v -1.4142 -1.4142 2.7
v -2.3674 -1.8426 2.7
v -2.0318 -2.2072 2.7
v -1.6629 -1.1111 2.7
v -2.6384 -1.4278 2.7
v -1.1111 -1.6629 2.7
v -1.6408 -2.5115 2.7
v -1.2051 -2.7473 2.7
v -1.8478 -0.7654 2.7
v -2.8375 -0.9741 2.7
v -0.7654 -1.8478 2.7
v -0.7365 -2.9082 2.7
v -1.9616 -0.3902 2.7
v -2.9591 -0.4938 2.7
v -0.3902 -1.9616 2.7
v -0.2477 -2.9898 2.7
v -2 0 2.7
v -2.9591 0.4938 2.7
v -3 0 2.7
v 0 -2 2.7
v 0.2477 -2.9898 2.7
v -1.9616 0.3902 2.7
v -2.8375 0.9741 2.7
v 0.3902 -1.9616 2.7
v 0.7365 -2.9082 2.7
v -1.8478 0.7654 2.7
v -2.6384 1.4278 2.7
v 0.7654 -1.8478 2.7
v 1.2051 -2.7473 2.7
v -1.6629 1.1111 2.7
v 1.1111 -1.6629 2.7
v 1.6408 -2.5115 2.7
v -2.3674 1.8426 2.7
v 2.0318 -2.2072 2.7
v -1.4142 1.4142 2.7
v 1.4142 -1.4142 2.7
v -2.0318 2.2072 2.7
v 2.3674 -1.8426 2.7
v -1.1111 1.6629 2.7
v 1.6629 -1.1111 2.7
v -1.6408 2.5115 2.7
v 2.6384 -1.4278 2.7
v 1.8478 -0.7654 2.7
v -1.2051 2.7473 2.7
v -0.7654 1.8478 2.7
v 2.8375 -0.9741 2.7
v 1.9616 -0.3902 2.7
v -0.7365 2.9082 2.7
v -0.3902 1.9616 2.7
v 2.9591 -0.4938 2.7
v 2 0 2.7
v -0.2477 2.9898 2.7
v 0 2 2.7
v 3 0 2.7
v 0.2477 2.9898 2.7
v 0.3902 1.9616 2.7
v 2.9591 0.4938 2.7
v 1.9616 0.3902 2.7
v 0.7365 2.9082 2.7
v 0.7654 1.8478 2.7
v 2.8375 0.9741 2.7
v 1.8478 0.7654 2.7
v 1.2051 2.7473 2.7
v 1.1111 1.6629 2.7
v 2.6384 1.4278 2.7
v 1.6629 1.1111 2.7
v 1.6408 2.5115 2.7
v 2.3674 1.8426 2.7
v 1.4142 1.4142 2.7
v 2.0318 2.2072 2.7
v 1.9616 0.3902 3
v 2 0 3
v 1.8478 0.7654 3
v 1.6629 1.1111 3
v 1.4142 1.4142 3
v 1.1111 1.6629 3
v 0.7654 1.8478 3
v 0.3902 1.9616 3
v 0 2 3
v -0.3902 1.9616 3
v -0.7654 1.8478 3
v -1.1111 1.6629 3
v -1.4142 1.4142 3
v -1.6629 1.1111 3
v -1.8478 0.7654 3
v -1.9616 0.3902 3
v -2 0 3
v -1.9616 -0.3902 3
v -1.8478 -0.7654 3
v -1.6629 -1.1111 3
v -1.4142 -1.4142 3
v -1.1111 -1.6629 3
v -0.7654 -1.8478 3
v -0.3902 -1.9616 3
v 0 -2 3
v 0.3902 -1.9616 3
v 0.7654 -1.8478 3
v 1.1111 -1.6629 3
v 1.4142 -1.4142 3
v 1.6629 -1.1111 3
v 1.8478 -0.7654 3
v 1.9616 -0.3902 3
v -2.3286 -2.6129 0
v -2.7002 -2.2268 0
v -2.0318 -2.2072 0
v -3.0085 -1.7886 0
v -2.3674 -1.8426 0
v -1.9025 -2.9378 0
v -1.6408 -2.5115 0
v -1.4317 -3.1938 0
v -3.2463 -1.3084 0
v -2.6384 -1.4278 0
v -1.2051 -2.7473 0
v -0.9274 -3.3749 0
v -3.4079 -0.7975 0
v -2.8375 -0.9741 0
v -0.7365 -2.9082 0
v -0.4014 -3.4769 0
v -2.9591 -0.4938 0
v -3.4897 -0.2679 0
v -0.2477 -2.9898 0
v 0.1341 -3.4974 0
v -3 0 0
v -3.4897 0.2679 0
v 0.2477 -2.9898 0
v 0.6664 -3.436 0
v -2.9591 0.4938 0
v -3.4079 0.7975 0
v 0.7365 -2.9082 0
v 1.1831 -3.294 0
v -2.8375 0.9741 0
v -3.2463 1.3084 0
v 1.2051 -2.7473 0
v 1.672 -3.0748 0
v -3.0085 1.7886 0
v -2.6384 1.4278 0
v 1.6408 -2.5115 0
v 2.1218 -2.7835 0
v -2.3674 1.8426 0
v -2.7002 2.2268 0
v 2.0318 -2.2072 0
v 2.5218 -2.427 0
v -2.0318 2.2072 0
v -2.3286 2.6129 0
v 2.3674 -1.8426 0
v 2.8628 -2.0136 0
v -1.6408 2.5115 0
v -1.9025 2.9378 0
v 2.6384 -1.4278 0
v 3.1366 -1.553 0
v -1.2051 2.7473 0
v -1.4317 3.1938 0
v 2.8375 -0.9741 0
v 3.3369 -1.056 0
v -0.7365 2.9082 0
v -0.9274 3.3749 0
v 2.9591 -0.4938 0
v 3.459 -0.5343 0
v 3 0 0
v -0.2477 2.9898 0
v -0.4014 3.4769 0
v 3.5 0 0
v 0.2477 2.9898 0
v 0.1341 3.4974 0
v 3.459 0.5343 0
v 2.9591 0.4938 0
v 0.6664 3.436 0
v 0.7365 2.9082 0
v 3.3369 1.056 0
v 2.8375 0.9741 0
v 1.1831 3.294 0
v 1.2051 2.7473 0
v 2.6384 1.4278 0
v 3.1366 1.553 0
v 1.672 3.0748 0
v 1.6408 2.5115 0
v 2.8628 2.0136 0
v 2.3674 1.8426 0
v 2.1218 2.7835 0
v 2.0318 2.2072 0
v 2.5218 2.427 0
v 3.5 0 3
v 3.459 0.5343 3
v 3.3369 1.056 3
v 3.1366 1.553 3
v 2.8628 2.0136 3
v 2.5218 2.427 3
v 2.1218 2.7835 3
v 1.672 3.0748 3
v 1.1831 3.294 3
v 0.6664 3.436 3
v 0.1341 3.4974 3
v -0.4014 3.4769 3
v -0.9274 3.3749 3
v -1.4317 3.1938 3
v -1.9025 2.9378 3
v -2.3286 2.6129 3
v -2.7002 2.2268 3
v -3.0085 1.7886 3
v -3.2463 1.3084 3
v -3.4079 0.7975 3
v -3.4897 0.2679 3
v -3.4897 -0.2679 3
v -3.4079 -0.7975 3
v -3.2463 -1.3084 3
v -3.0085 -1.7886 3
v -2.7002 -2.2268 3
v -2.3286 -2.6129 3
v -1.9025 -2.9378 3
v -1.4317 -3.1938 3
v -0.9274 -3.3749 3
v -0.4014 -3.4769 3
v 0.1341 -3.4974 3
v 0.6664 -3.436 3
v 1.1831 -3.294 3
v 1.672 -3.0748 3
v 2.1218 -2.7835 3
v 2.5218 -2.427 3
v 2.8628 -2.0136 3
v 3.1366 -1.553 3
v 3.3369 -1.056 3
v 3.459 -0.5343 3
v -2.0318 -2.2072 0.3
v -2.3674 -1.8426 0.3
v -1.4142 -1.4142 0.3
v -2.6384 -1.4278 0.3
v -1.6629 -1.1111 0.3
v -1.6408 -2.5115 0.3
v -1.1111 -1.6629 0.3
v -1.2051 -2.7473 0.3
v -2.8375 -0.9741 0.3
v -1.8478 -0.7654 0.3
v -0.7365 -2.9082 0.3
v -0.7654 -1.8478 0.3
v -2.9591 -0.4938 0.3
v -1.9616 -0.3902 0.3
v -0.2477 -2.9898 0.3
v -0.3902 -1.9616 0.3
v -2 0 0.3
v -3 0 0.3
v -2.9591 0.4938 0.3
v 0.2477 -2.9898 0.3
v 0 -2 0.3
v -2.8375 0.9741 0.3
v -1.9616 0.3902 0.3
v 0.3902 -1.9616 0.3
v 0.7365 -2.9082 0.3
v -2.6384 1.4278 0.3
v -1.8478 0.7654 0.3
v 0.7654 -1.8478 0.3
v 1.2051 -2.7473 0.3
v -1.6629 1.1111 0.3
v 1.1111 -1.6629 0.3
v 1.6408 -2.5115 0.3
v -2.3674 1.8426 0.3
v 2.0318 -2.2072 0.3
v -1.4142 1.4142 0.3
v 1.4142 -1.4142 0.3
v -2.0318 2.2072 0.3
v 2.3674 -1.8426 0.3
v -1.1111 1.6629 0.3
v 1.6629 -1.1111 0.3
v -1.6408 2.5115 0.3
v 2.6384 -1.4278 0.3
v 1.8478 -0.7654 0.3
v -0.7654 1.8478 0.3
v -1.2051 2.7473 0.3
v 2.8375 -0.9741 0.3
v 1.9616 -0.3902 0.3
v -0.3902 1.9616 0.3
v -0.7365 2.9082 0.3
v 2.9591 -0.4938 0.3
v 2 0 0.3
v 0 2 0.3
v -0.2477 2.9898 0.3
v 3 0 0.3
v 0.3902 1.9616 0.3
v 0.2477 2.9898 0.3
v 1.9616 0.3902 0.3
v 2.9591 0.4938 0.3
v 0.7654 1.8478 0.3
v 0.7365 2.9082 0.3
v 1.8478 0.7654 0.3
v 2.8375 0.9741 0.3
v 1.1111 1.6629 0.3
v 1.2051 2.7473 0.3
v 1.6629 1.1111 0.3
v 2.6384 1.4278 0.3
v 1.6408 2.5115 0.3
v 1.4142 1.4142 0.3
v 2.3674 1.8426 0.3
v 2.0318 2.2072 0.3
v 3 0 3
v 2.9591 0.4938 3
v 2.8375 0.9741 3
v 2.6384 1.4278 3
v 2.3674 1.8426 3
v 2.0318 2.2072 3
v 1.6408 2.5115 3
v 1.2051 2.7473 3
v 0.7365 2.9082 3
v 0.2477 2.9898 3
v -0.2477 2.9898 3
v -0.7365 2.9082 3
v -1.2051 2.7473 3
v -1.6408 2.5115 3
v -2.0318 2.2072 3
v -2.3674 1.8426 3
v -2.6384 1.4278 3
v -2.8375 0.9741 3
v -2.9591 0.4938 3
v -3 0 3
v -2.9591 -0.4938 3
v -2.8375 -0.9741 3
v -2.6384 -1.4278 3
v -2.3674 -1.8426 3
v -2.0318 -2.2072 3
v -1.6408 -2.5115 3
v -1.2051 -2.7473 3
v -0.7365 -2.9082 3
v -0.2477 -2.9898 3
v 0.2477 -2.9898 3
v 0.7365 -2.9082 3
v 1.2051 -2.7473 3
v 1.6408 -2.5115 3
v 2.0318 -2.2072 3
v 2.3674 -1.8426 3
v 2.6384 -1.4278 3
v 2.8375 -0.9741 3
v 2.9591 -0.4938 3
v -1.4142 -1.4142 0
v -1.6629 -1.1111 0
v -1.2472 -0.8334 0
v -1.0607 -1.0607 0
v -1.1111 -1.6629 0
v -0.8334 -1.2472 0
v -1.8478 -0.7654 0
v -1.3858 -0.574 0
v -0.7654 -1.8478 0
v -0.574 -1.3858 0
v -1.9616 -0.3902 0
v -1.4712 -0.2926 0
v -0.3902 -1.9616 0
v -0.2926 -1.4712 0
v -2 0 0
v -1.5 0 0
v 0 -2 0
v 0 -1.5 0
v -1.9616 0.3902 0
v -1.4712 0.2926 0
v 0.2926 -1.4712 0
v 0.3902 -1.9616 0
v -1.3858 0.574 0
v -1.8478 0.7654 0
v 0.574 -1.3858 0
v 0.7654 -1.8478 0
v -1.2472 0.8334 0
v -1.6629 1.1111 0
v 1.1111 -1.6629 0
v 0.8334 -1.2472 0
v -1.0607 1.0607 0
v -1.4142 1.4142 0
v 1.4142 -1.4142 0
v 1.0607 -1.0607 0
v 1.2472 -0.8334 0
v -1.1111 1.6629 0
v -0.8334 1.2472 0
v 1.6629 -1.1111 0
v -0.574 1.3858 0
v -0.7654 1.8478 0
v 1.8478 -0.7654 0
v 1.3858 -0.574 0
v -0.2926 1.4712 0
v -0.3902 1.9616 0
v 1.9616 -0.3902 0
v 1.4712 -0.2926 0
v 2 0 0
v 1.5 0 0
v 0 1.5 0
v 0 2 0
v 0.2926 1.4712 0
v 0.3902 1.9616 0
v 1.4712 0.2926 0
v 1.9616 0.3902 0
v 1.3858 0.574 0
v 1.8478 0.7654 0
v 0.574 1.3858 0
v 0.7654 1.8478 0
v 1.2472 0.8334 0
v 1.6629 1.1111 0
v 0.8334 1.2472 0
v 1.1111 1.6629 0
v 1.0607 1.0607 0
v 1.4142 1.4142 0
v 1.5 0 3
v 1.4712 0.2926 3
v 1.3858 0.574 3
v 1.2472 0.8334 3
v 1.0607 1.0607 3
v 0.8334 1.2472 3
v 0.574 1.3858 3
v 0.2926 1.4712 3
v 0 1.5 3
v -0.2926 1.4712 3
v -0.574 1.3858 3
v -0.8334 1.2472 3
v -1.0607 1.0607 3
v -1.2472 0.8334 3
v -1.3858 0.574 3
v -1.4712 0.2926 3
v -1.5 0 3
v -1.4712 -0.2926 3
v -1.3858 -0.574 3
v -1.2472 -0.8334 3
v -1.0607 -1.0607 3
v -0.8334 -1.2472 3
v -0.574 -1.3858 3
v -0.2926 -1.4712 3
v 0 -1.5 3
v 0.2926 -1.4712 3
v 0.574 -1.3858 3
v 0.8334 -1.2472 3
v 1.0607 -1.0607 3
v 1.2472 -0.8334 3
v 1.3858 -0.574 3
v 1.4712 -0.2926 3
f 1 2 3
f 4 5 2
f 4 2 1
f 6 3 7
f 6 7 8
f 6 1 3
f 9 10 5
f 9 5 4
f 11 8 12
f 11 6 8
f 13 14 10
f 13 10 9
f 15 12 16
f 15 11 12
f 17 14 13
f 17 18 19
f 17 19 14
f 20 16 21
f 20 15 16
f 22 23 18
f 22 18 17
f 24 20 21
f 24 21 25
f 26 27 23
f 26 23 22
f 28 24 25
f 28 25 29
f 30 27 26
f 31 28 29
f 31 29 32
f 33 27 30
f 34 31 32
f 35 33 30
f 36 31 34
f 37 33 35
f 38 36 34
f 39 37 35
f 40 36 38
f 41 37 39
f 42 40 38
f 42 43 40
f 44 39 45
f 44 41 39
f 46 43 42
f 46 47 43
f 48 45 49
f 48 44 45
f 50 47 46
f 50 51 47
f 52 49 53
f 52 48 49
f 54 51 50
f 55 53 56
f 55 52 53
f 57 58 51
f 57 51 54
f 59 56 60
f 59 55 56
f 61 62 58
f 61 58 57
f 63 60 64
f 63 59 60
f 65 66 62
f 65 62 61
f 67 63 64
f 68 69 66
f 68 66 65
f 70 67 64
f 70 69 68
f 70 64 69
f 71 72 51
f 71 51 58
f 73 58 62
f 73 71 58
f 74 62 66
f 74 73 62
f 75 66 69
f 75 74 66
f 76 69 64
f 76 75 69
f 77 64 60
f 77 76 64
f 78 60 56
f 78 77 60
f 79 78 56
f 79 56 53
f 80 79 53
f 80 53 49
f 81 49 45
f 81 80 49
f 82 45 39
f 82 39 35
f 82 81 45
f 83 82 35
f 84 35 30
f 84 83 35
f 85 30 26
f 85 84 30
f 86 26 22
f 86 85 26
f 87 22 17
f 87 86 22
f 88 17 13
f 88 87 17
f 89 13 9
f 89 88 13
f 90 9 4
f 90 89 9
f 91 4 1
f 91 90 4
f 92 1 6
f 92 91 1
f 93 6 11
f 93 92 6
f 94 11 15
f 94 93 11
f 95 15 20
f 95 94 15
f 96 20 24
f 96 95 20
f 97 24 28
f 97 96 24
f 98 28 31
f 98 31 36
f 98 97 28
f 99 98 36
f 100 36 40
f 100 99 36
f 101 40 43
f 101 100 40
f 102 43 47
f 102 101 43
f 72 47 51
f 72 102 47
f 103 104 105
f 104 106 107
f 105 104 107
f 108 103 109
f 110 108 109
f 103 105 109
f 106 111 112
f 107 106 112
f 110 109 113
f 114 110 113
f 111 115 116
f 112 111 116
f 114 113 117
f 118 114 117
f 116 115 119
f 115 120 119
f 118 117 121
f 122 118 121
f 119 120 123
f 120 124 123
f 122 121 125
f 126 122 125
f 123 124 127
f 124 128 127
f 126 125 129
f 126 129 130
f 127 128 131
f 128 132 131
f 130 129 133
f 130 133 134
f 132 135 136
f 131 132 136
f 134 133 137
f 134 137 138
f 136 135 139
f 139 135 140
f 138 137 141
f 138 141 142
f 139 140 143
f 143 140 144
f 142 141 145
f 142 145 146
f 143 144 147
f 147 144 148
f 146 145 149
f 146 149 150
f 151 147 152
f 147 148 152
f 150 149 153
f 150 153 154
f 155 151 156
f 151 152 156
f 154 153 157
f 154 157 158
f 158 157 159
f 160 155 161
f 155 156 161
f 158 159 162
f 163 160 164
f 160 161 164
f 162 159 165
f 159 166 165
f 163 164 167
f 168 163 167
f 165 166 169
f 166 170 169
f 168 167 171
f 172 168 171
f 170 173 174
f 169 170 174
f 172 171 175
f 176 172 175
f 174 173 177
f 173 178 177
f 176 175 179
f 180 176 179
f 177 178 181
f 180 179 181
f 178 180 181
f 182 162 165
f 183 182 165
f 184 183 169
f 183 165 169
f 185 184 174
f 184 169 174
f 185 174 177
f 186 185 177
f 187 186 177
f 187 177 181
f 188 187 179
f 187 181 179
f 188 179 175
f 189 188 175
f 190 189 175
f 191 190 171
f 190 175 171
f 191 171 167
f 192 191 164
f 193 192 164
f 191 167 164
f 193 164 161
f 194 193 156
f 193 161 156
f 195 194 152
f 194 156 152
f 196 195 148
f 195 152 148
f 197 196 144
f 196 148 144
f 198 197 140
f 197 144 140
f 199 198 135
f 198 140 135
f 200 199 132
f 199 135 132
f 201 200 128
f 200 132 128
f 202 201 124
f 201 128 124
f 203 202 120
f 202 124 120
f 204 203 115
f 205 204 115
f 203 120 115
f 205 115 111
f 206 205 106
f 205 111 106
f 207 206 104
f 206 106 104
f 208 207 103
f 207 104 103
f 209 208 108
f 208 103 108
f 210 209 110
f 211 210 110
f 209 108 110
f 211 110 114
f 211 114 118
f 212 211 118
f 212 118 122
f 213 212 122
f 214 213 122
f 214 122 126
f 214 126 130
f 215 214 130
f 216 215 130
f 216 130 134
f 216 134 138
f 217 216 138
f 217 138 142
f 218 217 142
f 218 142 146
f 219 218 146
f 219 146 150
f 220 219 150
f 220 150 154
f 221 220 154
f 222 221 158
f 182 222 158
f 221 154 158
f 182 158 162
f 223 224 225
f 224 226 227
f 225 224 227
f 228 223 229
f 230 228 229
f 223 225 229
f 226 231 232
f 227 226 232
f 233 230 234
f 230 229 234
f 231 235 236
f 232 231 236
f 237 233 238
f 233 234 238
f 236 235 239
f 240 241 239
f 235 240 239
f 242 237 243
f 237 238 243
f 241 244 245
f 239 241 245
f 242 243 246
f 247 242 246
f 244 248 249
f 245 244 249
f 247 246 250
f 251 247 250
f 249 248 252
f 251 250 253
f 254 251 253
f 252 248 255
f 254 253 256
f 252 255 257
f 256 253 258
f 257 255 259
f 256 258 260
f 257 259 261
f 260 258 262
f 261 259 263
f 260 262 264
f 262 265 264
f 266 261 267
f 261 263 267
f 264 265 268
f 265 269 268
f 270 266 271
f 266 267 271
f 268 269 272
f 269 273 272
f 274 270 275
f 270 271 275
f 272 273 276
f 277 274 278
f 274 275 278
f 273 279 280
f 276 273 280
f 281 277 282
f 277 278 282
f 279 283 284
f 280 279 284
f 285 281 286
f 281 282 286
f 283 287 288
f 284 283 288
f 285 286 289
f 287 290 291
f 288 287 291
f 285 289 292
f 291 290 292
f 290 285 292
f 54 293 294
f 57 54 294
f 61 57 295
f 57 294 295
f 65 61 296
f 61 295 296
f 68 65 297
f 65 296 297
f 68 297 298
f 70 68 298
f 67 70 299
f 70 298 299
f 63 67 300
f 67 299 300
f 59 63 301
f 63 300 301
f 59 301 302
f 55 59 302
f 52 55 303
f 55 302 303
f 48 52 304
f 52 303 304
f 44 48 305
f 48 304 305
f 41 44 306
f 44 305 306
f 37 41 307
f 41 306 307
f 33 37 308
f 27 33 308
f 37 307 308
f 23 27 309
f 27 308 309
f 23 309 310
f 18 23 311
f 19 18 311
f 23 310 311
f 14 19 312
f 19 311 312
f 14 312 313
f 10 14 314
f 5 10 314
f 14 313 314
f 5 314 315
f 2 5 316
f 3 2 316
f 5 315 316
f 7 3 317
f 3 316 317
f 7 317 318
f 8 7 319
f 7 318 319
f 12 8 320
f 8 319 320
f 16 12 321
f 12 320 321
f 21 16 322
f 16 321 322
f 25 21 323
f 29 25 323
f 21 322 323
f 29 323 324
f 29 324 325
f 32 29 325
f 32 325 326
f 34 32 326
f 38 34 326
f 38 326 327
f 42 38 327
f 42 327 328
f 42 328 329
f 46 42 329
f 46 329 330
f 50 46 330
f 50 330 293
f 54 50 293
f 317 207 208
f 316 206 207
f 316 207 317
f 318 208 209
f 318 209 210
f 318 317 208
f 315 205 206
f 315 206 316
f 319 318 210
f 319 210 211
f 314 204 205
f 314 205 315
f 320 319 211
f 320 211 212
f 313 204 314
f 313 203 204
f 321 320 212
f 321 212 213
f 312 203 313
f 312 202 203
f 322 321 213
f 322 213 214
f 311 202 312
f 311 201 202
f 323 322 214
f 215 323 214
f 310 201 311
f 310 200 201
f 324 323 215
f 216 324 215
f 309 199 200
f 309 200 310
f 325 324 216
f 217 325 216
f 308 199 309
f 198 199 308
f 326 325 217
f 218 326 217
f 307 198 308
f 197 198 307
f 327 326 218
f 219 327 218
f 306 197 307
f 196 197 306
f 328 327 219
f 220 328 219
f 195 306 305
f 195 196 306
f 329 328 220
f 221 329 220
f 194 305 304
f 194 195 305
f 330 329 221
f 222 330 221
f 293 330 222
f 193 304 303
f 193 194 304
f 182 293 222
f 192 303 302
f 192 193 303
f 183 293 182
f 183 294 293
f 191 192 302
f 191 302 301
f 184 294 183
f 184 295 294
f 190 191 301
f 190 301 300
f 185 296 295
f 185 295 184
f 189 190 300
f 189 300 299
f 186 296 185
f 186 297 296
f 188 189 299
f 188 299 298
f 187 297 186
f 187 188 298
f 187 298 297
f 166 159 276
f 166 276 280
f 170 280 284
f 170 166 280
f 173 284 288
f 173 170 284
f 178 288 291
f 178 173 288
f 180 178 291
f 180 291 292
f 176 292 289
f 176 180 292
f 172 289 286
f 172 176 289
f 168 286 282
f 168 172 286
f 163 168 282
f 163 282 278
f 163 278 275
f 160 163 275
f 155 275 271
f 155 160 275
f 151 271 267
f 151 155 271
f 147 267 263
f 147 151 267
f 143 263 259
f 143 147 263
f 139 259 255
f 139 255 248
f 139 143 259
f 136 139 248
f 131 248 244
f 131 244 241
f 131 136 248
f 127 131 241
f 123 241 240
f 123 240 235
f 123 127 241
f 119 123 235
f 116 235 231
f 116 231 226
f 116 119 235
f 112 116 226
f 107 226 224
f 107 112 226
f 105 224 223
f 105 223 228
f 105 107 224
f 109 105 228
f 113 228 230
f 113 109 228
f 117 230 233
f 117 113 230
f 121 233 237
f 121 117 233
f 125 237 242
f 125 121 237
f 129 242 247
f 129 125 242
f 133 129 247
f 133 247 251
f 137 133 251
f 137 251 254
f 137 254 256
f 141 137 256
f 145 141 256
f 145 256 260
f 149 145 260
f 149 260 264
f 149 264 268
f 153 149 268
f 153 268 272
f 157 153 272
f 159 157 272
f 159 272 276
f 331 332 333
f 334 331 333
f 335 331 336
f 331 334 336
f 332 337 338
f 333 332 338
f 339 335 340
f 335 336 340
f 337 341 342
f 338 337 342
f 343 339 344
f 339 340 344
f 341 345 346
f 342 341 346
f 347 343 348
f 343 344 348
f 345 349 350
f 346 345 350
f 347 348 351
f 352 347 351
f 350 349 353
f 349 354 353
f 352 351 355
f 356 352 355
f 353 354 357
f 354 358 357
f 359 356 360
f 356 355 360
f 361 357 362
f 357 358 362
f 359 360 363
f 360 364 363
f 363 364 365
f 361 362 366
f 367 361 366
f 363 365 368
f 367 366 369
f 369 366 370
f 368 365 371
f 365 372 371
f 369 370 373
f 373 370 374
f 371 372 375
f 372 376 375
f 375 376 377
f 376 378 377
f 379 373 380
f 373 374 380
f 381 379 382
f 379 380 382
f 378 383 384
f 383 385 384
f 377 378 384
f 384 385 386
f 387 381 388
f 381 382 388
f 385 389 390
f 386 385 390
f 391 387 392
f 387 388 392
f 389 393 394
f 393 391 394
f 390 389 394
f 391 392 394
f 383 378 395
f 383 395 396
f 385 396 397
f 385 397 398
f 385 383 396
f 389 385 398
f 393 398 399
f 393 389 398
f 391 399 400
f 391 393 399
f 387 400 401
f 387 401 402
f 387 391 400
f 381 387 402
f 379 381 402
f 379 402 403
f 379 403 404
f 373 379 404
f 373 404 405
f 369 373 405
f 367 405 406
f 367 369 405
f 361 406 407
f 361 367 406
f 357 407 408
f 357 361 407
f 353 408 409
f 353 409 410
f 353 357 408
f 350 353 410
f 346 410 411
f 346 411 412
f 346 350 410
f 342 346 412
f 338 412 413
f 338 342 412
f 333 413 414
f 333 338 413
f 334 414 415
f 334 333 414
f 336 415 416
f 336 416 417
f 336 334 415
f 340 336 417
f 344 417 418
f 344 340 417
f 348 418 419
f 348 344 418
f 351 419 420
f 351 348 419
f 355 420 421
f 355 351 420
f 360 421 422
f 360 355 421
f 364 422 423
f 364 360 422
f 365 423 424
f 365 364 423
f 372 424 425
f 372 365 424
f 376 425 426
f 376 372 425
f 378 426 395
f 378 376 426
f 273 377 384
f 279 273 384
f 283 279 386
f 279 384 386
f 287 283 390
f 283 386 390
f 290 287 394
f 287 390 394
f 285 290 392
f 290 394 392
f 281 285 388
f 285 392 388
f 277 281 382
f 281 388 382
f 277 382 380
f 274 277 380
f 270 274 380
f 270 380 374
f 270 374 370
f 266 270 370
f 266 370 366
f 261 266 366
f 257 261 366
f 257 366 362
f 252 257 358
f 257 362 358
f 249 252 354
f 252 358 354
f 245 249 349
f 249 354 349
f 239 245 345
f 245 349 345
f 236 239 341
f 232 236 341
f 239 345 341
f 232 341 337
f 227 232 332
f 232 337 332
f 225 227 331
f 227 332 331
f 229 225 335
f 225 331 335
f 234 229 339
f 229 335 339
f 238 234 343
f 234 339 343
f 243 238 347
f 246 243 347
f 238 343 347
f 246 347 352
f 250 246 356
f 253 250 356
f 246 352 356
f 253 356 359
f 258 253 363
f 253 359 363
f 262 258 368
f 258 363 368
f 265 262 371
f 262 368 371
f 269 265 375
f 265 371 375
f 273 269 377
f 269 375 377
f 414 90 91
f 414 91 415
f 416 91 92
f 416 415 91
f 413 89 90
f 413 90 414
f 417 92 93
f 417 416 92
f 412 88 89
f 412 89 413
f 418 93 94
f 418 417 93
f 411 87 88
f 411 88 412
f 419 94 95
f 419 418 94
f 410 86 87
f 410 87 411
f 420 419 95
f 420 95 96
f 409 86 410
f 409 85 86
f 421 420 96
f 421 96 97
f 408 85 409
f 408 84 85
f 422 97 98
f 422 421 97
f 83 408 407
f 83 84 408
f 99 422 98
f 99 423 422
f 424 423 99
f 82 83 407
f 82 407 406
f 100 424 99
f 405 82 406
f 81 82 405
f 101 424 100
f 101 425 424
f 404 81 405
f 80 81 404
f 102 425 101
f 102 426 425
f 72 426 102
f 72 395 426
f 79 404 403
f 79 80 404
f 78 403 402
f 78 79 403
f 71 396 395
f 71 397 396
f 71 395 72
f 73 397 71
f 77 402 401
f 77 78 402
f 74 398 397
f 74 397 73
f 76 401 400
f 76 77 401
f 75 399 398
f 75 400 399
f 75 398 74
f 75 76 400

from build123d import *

# Parameters (mm, degrees)
SKETCH1_R           = 3.5
SKETCH1_R_2         = 1.5
BOSS_EXTRUDE1_DEPTH = 3
SKETCH2_R           = 3
SKETCH2_R_2         = 2
CUT_EXTRUDE1_DEPTH  = 0.3
CUT_EXTRUDE2_START  = -3
SKETCH2_2_R         = 3
SKETCH2_2_R_2       = 2
CUT_EXTRUDE2_DEPTH  = 0.3


with BuildPart() as part:
    # Sketch1 → Boss-Extrude1 (new body)
    with BuildSketch(Plane.XY):
        Circle(SKETCH1_R)
        Circle(SKETCH1_R_2, mode=Mode.SUBTRACT)
    extrude(amount=BOSS_EXTRUDE1_DEPTH)

    # Sketch2 → Cut-Extrude1 (cut)
    with BuildSketch(Plane.XY.offset(3)):
        Circle(SKETCH2_R)
        Circle(SKETCH2_R_2, mode=Mode.SUBTRACT)
    extrude(amount=-CUT_EXTRUDE1_DEPTH, mode=Mode.SUBTRACT)

    # Sketch2<2> → Cut-Extrude2 (cut)
    with BuildSketch(Plane.XY.offset(3).offset(CUT_EXTRUDE2_START)):
        Circle(SKETCH2_2_R)
        Circle(SKETCH2_2_R_2, mode=Mode.SUBTRACT)
    extrude(amount=CUT_EXTRUDE2_DEPTH, mode=Mode.SUBTRACT)


solid = part.part
